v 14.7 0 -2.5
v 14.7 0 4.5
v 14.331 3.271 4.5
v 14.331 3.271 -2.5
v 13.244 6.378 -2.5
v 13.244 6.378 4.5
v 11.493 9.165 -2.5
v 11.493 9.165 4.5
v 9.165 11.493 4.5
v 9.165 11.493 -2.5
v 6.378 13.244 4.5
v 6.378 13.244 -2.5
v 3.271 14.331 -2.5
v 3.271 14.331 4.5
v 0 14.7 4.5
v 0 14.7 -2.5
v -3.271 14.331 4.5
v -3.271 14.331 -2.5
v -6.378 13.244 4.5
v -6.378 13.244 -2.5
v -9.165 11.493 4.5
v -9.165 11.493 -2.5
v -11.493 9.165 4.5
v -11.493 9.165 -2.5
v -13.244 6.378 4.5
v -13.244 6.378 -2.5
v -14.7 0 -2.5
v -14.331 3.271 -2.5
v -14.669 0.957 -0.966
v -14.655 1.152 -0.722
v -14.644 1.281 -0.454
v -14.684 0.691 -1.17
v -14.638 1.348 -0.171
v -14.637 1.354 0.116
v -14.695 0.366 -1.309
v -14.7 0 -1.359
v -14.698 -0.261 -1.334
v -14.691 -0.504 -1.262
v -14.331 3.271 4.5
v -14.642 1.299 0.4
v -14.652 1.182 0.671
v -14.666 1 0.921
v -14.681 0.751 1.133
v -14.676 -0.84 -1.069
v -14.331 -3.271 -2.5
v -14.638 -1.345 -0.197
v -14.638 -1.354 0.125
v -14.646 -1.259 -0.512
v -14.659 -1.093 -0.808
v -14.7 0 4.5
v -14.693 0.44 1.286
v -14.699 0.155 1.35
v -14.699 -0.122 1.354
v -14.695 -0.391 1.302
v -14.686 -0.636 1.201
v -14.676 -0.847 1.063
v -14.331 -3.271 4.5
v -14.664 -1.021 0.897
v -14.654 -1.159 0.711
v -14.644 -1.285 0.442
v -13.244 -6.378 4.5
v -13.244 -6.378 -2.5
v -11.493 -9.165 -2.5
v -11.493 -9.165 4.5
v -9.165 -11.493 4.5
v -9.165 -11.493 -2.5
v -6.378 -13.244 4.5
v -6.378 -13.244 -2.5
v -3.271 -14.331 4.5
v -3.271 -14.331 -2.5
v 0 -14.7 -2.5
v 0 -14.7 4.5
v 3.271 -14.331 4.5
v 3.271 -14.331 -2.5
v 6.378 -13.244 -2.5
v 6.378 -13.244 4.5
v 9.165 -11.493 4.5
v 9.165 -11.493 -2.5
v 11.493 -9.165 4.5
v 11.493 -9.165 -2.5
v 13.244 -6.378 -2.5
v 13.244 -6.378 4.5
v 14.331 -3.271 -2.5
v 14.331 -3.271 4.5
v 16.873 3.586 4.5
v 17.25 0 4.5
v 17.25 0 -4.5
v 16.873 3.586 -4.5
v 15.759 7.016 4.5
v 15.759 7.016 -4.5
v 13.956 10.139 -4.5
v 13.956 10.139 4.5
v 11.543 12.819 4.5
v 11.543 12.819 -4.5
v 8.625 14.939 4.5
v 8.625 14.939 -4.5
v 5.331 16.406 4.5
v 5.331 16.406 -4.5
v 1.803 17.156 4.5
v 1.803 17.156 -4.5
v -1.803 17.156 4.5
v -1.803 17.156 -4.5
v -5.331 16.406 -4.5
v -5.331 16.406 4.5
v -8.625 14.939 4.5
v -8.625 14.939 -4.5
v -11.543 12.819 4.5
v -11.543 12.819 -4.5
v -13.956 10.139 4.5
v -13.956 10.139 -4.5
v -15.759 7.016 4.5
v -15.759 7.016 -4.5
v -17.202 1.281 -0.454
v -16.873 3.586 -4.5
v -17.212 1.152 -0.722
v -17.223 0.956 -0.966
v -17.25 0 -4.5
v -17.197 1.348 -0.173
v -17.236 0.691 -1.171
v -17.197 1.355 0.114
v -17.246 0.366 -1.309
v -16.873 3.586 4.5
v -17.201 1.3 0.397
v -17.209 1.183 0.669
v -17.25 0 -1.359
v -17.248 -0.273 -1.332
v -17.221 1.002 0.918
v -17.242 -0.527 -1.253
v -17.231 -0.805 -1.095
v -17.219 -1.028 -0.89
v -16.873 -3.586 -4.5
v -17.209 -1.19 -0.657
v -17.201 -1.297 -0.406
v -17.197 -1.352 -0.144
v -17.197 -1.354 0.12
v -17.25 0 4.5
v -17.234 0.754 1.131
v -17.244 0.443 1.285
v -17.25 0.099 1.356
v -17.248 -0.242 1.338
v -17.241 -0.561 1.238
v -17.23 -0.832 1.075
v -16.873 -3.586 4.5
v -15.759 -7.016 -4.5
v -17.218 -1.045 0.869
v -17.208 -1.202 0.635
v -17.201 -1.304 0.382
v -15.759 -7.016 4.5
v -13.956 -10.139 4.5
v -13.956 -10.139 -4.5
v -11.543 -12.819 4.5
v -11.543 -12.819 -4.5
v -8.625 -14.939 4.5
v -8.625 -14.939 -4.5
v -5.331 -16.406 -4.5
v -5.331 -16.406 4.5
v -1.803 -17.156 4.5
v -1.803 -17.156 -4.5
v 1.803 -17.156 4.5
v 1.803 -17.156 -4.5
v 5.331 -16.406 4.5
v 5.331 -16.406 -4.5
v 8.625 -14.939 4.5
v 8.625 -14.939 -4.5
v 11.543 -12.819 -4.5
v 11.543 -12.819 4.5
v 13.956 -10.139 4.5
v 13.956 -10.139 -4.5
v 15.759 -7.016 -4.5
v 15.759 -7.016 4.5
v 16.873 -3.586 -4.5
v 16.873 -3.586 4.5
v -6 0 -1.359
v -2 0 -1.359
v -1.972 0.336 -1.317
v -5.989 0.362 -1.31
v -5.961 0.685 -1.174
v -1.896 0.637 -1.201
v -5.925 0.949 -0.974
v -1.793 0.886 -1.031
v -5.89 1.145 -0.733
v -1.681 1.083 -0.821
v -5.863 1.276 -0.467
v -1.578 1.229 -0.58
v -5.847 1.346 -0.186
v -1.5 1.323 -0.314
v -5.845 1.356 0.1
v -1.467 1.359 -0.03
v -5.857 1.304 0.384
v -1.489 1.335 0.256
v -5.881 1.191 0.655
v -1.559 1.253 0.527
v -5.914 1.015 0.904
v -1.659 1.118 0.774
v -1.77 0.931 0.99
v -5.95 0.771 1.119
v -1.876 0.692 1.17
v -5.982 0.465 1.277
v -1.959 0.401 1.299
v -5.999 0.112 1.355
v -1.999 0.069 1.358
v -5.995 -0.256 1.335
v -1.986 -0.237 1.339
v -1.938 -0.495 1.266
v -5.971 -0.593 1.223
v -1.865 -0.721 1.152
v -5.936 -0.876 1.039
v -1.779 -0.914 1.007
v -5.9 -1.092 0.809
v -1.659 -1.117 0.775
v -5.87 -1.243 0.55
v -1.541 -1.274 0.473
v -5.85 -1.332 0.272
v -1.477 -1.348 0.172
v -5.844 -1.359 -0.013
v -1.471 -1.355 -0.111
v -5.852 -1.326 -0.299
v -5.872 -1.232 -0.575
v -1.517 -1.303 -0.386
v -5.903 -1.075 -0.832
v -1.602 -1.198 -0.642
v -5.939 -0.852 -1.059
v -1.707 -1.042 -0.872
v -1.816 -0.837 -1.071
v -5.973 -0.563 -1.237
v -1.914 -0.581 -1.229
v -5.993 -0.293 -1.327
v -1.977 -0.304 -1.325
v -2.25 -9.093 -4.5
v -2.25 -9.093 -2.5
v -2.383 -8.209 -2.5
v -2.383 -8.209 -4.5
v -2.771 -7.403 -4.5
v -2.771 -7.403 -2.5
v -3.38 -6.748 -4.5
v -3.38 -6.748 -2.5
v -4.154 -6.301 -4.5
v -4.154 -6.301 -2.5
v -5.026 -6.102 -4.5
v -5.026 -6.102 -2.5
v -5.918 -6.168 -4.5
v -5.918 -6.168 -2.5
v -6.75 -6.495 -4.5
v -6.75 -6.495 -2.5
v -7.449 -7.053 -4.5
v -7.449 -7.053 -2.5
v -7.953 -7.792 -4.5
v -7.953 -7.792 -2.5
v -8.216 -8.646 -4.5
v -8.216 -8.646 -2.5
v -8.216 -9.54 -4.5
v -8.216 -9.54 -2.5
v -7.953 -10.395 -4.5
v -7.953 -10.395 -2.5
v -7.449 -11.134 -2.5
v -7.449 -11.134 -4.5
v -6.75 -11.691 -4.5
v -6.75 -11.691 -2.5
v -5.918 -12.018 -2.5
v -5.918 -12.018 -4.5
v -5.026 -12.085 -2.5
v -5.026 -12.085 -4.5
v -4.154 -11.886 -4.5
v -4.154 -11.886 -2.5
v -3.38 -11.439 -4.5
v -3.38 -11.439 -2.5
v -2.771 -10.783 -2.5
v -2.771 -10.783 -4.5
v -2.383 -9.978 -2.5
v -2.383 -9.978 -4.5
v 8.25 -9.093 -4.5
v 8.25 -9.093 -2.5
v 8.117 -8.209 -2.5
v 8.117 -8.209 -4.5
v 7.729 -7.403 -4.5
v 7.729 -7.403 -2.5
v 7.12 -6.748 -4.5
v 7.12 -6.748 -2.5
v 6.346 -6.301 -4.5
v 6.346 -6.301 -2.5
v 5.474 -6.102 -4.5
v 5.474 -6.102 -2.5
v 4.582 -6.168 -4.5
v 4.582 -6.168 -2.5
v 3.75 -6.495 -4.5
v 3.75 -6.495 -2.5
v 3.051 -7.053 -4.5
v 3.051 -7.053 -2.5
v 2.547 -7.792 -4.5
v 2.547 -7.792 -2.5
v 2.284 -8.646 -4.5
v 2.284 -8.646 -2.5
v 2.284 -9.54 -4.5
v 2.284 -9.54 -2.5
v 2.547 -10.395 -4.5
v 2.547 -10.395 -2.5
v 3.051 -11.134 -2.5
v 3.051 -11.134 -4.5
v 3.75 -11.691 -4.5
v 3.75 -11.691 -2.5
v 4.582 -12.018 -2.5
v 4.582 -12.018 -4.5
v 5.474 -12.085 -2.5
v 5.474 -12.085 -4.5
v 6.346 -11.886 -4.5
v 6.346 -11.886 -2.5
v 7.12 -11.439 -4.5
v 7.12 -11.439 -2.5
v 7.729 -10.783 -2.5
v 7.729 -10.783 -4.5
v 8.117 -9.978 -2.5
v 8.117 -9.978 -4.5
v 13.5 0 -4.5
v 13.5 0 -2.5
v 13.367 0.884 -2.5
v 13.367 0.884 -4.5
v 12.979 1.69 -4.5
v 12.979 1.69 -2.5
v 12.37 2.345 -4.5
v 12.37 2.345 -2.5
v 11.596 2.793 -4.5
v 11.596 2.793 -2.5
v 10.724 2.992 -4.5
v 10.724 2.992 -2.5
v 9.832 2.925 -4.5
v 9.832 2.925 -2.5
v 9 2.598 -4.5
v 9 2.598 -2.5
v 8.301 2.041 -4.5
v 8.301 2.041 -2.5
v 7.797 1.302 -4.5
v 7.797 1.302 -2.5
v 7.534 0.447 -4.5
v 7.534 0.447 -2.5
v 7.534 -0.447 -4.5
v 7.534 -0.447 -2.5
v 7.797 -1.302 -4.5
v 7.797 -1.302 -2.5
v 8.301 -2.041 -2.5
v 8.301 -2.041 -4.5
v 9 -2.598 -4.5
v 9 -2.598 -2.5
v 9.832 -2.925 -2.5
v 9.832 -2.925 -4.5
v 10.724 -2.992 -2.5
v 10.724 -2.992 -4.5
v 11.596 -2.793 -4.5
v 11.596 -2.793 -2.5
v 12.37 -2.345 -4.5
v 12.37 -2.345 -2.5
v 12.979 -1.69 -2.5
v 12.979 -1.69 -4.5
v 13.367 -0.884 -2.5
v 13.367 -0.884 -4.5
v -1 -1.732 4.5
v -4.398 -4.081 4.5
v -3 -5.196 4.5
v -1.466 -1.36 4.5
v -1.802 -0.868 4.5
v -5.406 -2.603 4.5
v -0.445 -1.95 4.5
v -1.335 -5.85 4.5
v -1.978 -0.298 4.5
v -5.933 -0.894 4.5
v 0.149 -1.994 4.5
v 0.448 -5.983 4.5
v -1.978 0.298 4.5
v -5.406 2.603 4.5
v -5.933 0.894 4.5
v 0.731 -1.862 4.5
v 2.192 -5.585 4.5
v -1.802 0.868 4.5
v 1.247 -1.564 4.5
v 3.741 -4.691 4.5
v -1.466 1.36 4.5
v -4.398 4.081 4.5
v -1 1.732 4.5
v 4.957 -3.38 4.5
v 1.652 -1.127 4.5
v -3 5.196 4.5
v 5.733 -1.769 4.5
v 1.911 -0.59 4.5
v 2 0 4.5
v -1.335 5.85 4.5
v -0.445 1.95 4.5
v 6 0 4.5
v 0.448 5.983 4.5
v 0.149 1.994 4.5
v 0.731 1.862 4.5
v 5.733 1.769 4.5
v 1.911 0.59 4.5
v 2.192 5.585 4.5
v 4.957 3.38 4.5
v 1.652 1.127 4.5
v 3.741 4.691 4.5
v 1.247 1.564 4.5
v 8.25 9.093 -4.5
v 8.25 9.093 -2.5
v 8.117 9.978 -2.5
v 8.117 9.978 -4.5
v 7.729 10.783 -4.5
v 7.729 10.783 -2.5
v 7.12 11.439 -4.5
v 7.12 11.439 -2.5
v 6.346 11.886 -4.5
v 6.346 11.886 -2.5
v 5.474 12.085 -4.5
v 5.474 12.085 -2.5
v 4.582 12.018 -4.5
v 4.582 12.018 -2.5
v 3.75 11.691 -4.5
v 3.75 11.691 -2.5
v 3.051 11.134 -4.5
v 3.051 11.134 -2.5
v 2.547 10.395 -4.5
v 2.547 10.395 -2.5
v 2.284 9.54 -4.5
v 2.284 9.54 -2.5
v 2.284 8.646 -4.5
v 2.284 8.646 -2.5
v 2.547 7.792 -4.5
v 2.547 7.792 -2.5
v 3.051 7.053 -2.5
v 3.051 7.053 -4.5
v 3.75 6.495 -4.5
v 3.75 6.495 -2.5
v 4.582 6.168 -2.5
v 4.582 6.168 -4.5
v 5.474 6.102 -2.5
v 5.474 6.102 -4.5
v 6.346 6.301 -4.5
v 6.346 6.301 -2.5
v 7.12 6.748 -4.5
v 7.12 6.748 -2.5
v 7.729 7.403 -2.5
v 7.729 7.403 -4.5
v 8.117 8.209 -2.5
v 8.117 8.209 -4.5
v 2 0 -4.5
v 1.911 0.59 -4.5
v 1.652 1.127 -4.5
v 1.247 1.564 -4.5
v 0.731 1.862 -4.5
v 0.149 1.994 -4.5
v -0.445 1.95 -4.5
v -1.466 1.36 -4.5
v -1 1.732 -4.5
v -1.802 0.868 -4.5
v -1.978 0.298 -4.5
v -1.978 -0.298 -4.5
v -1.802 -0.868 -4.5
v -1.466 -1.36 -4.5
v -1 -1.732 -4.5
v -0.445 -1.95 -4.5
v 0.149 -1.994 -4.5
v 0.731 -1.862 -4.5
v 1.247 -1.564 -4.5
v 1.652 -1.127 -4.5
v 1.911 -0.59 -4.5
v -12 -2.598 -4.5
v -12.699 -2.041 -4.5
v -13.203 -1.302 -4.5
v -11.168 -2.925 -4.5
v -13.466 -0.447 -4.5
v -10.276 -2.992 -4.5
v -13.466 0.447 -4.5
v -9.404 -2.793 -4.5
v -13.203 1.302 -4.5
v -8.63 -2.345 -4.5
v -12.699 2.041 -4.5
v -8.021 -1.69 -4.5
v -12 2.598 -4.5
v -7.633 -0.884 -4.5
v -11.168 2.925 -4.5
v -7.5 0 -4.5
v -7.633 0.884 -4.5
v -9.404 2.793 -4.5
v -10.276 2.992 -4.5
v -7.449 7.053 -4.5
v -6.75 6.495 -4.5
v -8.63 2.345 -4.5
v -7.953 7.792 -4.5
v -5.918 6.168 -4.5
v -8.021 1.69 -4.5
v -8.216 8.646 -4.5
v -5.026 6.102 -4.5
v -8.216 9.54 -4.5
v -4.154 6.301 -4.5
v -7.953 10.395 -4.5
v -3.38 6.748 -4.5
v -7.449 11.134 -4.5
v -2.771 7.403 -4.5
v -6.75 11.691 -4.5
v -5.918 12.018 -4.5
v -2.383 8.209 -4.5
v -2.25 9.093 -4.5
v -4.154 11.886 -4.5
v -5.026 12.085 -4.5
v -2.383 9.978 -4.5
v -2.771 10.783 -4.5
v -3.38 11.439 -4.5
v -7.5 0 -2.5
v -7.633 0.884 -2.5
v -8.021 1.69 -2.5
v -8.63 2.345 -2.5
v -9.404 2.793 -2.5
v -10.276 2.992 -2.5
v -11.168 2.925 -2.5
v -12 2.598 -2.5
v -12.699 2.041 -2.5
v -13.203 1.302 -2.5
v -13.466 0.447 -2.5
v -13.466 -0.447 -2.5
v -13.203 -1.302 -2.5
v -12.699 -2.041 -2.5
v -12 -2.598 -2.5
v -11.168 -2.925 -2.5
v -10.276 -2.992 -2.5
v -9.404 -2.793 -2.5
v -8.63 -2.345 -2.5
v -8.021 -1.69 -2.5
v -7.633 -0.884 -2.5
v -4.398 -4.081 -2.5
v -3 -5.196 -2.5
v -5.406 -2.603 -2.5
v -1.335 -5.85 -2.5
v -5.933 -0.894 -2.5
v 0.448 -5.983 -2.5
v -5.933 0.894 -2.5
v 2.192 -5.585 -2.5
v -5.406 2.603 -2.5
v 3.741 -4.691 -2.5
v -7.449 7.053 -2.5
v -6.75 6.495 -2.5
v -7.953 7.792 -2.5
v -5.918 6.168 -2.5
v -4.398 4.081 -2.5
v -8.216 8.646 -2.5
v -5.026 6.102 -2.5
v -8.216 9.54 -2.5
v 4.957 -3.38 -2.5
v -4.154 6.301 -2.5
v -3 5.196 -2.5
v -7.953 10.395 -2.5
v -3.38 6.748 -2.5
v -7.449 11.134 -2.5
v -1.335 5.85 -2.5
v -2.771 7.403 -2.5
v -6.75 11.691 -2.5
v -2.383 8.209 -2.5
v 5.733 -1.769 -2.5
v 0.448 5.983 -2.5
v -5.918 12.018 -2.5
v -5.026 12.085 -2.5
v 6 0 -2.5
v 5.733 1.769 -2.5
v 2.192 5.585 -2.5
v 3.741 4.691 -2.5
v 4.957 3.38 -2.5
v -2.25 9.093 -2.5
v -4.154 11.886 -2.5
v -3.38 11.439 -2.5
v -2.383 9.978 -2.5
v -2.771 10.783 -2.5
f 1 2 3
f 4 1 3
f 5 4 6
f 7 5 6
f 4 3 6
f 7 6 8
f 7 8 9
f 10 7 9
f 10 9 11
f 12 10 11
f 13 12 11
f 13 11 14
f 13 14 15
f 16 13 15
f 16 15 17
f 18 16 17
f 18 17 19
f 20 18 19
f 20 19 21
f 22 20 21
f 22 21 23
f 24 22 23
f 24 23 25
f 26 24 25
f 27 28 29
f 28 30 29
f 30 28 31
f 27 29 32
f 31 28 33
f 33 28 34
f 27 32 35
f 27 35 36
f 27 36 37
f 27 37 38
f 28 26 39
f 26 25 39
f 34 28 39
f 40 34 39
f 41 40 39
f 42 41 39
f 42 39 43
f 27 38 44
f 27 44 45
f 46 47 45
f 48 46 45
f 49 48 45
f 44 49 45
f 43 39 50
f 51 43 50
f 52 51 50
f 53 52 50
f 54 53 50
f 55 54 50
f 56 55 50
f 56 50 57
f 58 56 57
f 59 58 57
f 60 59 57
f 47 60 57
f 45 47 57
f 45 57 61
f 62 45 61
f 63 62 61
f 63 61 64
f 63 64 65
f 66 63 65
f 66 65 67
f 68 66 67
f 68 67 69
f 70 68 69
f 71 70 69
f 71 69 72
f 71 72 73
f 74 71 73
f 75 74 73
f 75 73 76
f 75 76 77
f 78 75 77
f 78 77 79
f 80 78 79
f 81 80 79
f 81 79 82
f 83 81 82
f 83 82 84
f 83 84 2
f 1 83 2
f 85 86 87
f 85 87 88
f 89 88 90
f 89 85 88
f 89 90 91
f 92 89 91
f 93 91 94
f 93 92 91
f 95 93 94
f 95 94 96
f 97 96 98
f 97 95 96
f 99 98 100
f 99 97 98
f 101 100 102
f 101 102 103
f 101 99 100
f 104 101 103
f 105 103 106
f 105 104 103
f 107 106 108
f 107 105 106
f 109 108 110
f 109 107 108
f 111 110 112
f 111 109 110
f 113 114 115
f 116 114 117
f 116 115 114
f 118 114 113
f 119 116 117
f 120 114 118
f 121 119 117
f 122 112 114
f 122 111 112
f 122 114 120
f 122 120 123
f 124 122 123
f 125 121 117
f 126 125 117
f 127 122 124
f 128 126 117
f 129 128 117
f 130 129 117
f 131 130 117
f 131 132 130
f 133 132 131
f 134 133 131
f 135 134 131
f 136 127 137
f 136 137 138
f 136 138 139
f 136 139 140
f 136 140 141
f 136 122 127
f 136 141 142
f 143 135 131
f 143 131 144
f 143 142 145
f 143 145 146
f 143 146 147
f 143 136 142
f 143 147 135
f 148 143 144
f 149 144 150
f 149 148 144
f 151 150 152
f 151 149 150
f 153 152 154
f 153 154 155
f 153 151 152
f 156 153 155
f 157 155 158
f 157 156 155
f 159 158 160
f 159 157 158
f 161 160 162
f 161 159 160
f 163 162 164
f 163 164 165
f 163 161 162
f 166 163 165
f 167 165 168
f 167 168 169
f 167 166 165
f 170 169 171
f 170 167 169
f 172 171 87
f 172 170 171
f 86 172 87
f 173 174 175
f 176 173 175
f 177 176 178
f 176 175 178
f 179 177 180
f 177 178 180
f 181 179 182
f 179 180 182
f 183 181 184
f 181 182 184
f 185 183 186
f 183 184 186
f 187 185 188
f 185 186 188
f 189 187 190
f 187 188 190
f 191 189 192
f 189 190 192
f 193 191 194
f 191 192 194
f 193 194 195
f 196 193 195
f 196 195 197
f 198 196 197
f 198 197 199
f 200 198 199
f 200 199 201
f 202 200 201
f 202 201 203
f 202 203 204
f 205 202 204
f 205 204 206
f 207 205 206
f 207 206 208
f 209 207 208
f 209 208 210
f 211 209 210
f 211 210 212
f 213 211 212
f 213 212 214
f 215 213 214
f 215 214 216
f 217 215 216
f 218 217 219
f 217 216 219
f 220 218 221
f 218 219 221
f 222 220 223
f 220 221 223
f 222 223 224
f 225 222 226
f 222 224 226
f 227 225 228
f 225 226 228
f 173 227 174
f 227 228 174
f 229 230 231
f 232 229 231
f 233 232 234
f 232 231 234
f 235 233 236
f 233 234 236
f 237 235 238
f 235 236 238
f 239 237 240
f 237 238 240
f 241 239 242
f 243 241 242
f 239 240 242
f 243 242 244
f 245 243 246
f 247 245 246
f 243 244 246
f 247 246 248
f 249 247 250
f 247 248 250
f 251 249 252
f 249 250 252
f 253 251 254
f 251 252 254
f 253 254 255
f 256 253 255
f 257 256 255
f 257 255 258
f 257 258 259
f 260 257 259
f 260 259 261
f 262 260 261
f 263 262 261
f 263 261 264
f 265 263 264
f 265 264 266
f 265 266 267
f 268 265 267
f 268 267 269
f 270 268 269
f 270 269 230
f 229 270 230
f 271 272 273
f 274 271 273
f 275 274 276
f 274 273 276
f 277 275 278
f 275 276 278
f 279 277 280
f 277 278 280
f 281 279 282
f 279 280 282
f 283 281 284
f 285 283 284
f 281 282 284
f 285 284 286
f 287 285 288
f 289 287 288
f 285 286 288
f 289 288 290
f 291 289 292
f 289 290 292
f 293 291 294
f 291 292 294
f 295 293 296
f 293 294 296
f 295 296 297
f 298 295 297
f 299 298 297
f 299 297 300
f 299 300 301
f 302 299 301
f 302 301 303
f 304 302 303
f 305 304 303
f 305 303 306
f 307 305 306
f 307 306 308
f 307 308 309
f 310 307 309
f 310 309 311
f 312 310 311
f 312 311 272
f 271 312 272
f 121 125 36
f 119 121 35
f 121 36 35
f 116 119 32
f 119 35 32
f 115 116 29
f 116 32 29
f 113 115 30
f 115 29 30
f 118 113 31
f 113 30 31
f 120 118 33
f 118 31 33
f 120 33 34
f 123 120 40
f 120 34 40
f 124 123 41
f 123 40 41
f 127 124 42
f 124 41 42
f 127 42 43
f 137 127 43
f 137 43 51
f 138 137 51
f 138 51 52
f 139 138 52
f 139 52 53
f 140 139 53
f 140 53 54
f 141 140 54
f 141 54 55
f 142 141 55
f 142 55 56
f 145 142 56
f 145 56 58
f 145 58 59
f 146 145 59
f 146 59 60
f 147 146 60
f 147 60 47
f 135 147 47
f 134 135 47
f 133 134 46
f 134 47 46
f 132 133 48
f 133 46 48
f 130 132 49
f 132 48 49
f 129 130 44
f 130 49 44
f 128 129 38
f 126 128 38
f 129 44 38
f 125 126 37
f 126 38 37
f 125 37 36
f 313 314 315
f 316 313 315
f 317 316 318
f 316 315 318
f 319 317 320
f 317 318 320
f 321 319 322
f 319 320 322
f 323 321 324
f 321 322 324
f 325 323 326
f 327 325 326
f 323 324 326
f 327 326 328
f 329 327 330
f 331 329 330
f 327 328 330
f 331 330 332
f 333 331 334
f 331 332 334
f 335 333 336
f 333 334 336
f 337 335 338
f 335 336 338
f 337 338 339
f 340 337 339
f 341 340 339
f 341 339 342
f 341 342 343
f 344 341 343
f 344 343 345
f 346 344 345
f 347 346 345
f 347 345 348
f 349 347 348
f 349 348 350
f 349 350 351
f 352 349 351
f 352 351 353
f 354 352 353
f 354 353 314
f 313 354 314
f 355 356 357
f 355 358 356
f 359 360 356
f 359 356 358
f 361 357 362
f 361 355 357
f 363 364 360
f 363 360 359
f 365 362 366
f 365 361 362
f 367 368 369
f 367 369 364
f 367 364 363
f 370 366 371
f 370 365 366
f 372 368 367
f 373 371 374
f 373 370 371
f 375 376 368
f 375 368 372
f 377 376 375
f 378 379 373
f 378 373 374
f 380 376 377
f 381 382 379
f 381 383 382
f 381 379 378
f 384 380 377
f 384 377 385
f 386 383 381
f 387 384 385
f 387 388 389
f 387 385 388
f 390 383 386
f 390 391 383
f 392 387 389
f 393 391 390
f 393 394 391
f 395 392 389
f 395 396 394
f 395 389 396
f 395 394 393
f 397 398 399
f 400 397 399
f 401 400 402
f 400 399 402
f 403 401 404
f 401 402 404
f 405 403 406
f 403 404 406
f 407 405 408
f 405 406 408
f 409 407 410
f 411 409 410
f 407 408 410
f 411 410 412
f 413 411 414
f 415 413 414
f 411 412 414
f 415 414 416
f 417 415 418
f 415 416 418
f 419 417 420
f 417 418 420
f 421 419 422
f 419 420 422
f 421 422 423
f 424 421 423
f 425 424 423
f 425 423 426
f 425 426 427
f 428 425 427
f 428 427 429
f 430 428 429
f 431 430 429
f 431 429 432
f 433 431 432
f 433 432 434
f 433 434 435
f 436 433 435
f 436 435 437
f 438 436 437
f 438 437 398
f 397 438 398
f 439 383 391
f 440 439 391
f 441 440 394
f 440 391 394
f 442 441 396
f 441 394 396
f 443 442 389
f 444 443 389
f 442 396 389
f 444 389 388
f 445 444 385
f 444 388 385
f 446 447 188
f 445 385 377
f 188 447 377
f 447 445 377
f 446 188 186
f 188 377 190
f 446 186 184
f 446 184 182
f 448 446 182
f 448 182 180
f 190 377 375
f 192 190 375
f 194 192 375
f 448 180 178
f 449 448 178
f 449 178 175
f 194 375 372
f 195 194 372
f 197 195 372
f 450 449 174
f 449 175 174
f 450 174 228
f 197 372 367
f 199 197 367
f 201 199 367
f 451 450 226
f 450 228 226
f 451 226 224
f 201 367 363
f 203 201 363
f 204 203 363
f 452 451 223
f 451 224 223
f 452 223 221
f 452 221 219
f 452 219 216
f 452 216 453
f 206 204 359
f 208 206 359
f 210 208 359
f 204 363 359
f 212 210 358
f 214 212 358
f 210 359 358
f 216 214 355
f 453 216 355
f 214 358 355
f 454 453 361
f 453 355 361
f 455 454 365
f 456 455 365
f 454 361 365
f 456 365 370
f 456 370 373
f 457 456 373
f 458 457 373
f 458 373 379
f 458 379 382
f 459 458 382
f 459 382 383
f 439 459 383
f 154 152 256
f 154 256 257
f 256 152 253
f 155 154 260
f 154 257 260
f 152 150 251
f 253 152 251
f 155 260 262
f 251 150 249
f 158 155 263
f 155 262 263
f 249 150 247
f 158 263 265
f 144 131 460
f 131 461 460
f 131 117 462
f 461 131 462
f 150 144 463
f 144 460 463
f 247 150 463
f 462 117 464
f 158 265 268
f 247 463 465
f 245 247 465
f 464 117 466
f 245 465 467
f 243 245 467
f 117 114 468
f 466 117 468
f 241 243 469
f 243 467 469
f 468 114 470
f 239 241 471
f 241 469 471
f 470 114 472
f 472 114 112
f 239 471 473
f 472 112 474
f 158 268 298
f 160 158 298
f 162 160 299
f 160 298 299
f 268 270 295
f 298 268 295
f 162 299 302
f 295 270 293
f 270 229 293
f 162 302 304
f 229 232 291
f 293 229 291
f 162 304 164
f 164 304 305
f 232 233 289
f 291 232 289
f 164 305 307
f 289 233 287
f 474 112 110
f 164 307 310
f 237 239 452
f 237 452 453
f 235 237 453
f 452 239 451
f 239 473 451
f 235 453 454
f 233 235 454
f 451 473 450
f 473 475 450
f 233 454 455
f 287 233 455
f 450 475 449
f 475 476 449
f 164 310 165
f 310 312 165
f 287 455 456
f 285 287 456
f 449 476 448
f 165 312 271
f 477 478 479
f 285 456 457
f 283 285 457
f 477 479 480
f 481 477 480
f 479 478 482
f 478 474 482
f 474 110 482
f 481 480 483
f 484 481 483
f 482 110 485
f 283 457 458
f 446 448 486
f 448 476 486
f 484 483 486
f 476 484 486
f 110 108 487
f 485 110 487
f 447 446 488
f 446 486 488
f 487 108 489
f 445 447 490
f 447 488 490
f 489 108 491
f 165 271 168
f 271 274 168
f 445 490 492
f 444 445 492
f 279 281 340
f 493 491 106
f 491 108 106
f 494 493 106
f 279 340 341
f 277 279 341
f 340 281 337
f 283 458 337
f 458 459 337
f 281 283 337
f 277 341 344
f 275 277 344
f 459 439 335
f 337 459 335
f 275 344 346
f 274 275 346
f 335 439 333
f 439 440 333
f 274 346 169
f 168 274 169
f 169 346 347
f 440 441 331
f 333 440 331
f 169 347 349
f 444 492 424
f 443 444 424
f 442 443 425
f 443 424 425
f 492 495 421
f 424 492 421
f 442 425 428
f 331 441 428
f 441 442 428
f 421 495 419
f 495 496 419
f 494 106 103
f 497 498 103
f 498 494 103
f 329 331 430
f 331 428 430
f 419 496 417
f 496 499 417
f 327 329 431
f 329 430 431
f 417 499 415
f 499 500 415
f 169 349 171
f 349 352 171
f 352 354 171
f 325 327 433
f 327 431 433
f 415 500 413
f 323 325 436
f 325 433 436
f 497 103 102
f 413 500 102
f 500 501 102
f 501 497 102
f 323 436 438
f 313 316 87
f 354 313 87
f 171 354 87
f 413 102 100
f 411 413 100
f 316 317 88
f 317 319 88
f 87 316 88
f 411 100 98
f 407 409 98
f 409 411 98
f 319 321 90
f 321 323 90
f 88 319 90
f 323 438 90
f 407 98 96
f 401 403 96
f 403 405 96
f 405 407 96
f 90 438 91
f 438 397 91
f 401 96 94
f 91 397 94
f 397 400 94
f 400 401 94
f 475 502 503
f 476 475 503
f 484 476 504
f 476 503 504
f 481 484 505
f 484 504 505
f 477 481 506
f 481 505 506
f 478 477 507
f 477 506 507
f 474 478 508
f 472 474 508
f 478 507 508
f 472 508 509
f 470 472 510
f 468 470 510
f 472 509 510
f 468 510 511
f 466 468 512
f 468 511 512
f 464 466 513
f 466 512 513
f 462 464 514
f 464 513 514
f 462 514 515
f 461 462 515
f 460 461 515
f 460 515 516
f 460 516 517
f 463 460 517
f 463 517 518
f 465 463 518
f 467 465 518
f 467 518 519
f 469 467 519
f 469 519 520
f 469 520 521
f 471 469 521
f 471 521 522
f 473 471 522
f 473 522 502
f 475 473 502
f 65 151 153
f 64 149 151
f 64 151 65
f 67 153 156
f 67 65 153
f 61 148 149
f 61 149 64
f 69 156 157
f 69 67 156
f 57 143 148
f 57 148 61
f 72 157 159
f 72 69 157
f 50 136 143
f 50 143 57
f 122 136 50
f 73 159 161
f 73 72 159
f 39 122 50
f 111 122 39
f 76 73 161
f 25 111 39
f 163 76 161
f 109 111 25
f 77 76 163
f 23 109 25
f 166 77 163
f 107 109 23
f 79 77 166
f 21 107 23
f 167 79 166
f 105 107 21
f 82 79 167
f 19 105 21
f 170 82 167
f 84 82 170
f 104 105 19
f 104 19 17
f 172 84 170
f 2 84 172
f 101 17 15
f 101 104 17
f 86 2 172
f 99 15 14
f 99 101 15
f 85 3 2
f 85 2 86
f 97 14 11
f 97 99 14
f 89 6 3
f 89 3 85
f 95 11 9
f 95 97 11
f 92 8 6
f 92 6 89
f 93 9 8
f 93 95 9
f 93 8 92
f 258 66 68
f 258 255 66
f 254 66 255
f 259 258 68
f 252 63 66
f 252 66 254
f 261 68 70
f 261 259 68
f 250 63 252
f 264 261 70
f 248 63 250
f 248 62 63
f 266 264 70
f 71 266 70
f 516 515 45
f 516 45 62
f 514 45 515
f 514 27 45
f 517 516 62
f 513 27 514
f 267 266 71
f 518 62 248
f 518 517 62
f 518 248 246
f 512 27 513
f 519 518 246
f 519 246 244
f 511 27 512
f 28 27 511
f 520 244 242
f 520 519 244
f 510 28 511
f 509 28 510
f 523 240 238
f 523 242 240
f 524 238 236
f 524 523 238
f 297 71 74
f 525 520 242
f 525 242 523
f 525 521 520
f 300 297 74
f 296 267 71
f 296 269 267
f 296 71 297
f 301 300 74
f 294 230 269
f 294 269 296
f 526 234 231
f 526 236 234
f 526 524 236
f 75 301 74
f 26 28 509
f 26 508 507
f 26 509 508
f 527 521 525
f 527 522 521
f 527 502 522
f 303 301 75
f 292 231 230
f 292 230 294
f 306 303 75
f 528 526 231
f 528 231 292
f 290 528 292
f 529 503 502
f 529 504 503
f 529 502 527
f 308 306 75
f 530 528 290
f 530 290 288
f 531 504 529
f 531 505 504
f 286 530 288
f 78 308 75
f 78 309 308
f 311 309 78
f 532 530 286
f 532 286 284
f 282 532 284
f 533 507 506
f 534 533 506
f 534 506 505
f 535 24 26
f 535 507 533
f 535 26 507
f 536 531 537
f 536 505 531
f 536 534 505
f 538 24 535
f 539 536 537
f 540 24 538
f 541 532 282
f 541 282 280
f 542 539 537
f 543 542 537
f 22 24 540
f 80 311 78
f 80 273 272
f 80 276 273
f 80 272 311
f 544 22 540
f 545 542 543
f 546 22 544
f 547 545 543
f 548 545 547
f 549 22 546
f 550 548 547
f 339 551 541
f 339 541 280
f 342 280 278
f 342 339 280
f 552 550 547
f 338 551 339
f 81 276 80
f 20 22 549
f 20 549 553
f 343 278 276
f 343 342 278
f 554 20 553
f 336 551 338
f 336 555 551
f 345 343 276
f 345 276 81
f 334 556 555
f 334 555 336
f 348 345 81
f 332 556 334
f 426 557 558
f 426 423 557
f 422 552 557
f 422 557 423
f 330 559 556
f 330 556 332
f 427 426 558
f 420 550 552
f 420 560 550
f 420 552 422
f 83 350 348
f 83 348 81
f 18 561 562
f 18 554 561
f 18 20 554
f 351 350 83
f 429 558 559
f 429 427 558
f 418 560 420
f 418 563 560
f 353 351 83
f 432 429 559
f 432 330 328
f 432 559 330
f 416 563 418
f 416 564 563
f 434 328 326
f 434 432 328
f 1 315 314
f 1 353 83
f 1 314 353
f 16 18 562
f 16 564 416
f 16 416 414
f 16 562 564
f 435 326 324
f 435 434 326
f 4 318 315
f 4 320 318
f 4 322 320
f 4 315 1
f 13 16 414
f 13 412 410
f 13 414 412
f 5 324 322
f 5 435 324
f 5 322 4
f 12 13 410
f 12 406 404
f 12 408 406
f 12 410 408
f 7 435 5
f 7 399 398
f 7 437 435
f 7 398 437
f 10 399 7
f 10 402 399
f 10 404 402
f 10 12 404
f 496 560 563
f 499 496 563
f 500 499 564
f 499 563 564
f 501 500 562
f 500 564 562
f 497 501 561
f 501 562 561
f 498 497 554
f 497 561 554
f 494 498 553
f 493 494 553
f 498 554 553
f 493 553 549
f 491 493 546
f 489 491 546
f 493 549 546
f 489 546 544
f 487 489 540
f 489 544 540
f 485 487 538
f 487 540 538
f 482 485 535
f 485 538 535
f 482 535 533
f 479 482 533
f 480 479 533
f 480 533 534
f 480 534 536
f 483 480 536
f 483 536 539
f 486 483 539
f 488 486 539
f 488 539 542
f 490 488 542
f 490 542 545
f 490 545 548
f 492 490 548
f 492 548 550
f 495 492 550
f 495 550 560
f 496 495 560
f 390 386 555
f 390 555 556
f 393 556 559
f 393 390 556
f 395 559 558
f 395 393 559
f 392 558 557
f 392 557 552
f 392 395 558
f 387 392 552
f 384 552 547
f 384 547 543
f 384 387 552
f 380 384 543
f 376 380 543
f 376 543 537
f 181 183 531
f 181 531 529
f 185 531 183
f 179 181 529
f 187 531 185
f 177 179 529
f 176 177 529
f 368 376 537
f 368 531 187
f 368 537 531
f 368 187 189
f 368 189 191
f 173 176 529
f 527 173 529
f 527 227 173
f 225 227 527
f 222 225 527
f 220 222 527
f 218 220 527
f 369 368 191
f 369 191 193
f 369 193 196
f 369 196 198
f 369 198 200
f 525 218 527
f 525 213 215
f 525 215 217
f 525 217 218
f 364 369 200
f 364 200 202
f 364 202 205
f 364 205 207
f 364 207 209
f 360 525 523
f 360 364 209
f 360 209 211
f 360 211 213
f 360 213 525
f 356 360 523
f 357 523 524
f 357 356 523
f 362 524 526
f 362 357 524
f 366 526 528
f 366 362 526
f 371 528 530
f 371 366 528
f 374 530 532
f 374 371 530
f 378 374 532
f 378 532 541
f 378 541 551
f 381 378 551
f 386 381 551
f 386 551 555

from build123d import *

# Parameters (mm, degrees)
SKETCH1_R           = 17.25
BOSS_EXTRUDE1_DEPTH = 4.5
SKETCH2_R           = 2
CUT_EXTRUDE1_DEPTH  = 9
SKETCH3_R           = 14.7
SKETCH3_R_2         = 6
CUT_EXTRUDE2_DEPTH  = 7
CUT_EXTRUDE3_REACH  = 4
SKETCH4_R           = 3
SKETCH5_R           = 1.35933313
CUT_EXTRUDE4_DEPTH  = 18


with BuildPart() as part:
    # Sketch1 → Boss-Extrude1 (new body, symmetric)
    with BuildSketch(Plane.XY):
        Circle(SKETCH1_R)
    extrude(amount=BOSS_EXTRUDE1_DEPTH, both=True)

    # Sketch2 → Cut-Extrude1 (cut)
    with BuildSketch(Plane.XY.offset(4.5)):
        Circle(SKETCH2_R)
    extrude(amount=-CUT_EXTRUDE1_DEPTH, mode=Mode.SUBTRACT)

    # Sketch3 → Cut-Extrude2 (cut)
    with BuildSketch(Plane.XY.offset(4.5)):
        Circle(SKETCH3_R)
        Circle(SKETCH3_R_2, mode=Mode.SUBTRACT)
    extrude(amount=-CUT_EXTRUDE2_DEPTH, mode=Mode.SUBTRACT)

    # Sketch4 → Cut-Extrude3 (cut, up to next)
    with BuildSketch(Plane.XY.offset(-2.5), mode=Mode.PRIVATE) as cut_extrude3_sk1:
        with Locations((10.5, 0)):
            Circle(SKETCH4_R)
    cut_extrude3_tool1 = extrude(cut_extrude3_sk1.sketch, amount=-CUT_EXTRUDE3_REACH, mode=Mode.PRIVATE) & part.part
    add(cut_extrude3_tool1.solids().sort_by_distance((10.5, 0, -2.5))[0], mode=Mode.SUBTRACT)
    # Sketch4 → Cut-Extrude3 (cut, up to next)
    with BuildSketch(Plane.XY.offset(-2.5), mode=Mode.PRIVATE) as cut_extrude3_sk2:
        with Locations((5.25, -9.09326674)):
            Circle(SKETCH4_R)
    cut_extrude3_tool2 = extrude(cut_extrude3_sk2.sketch, amount=-CUT_EXTRUDE3_REACH, mode=Mode.PRIVATE) & part.part
    add(cut_extrude3_tool2.solids().sort_by_distance((5.25, -9.093267, -2.5))[0], mode=Mode.SUBTRACT)
    # Sketch4 → Cut-Extrude3 (cut, up to next)
    with BuildSketch(Plane.XY.offset(-2.5), mode=Mode.PRIVATE) as cut_extrude3_sk3:
        with Locations((-5.25, -9.09326674)):
            Circle(SKETCH4_R)
    cut_extrude3_tool3 = extrude(cut_extrude3_sk3.sketch, amount=-CUT_EXTRUDE3_REACH, mode=Mode.PRIVATE) & part.part
    add(cut_extrude3_tool3.solids().sort_by_distance((-5.25, -9.093267, -2.5))[0], mode=Mode.SUBTRACT)
    # Sketch4 → Cut-Extrude3 (cut, up to next)
    with BuildSketch(Plane.XY.offset(-2.5), mode=Mode.PRIVATE) as cut_extrude3_sk4:
        with Locations((-10.5, 0)):
            Circle(SKETCH4_R)
    cut_extrude3_tool4 = extrude(cut_extrude3_sk4.sketch, amount=-CUT_EXTRUDE3_REACH, mode=Mode.PRIVATE) & part.part
    add(cut_extrude3_tool4.solids().sort_by_distance((-10.5, 0, -2.5))[0], mode=Mode.SUBTRACT)
    # Sketch4 → Cut-Extrude3 (cut, up to next)
    with BuildSketch(Plane.XY.offset(-2.5), mode=Mode.PRIVATE) as cut_extrude3_sk5:
        with Locations((-5.25, 9.09326674)):
            Circle(SKETCH4_R)
    cut_extrude3_tool5 = extrude(cut_extrude3_sk5.sketch, amount=-CUT_EXTRUDE3_REACH, mode=Mode.PRIVATE) & part.part
    add(cut_extrude3_tool5.solids().sort_by_distance((-5.25, 9.093267, -2.5))[0], mode=Mode.SUBTRACT)
    # Sketch4 → Cut-Extrude3 (cut, up to next)
    with BuildSketch(Plane.XY.offset(-2.5), mode=Mode.PRIVATE) as cut_extrude3_sk6:
        with Locations((5.25, 9.09326674)):
            Circle(SKETCH4_R)
    cut_extrude3_tool6 = extrude(cut_extrude3_sk6.sketch, amount=-CUT_EXTRUDE3_REACH, mode=Mode.PRIVATE) & part.part
    add(cut_extrude3_tool6.solids().sort_by_distance((5.25, 9.093267, -2.5))[0], mode=Mode.SUBTRACT)

    # Sketch5 → Cut-Extrude4 (cut)
    with BuildSketch(Plane(origin=(0, 0, 0), x_dir=(0, 0, -1), z_dir=(1, 0, 0))):
        Circle(SKETCH5_R)
    extrude(amount=-CUT_EXTRUDE4_DEPTH, mode=Mode.SUBTRACT)


solid = part.part
